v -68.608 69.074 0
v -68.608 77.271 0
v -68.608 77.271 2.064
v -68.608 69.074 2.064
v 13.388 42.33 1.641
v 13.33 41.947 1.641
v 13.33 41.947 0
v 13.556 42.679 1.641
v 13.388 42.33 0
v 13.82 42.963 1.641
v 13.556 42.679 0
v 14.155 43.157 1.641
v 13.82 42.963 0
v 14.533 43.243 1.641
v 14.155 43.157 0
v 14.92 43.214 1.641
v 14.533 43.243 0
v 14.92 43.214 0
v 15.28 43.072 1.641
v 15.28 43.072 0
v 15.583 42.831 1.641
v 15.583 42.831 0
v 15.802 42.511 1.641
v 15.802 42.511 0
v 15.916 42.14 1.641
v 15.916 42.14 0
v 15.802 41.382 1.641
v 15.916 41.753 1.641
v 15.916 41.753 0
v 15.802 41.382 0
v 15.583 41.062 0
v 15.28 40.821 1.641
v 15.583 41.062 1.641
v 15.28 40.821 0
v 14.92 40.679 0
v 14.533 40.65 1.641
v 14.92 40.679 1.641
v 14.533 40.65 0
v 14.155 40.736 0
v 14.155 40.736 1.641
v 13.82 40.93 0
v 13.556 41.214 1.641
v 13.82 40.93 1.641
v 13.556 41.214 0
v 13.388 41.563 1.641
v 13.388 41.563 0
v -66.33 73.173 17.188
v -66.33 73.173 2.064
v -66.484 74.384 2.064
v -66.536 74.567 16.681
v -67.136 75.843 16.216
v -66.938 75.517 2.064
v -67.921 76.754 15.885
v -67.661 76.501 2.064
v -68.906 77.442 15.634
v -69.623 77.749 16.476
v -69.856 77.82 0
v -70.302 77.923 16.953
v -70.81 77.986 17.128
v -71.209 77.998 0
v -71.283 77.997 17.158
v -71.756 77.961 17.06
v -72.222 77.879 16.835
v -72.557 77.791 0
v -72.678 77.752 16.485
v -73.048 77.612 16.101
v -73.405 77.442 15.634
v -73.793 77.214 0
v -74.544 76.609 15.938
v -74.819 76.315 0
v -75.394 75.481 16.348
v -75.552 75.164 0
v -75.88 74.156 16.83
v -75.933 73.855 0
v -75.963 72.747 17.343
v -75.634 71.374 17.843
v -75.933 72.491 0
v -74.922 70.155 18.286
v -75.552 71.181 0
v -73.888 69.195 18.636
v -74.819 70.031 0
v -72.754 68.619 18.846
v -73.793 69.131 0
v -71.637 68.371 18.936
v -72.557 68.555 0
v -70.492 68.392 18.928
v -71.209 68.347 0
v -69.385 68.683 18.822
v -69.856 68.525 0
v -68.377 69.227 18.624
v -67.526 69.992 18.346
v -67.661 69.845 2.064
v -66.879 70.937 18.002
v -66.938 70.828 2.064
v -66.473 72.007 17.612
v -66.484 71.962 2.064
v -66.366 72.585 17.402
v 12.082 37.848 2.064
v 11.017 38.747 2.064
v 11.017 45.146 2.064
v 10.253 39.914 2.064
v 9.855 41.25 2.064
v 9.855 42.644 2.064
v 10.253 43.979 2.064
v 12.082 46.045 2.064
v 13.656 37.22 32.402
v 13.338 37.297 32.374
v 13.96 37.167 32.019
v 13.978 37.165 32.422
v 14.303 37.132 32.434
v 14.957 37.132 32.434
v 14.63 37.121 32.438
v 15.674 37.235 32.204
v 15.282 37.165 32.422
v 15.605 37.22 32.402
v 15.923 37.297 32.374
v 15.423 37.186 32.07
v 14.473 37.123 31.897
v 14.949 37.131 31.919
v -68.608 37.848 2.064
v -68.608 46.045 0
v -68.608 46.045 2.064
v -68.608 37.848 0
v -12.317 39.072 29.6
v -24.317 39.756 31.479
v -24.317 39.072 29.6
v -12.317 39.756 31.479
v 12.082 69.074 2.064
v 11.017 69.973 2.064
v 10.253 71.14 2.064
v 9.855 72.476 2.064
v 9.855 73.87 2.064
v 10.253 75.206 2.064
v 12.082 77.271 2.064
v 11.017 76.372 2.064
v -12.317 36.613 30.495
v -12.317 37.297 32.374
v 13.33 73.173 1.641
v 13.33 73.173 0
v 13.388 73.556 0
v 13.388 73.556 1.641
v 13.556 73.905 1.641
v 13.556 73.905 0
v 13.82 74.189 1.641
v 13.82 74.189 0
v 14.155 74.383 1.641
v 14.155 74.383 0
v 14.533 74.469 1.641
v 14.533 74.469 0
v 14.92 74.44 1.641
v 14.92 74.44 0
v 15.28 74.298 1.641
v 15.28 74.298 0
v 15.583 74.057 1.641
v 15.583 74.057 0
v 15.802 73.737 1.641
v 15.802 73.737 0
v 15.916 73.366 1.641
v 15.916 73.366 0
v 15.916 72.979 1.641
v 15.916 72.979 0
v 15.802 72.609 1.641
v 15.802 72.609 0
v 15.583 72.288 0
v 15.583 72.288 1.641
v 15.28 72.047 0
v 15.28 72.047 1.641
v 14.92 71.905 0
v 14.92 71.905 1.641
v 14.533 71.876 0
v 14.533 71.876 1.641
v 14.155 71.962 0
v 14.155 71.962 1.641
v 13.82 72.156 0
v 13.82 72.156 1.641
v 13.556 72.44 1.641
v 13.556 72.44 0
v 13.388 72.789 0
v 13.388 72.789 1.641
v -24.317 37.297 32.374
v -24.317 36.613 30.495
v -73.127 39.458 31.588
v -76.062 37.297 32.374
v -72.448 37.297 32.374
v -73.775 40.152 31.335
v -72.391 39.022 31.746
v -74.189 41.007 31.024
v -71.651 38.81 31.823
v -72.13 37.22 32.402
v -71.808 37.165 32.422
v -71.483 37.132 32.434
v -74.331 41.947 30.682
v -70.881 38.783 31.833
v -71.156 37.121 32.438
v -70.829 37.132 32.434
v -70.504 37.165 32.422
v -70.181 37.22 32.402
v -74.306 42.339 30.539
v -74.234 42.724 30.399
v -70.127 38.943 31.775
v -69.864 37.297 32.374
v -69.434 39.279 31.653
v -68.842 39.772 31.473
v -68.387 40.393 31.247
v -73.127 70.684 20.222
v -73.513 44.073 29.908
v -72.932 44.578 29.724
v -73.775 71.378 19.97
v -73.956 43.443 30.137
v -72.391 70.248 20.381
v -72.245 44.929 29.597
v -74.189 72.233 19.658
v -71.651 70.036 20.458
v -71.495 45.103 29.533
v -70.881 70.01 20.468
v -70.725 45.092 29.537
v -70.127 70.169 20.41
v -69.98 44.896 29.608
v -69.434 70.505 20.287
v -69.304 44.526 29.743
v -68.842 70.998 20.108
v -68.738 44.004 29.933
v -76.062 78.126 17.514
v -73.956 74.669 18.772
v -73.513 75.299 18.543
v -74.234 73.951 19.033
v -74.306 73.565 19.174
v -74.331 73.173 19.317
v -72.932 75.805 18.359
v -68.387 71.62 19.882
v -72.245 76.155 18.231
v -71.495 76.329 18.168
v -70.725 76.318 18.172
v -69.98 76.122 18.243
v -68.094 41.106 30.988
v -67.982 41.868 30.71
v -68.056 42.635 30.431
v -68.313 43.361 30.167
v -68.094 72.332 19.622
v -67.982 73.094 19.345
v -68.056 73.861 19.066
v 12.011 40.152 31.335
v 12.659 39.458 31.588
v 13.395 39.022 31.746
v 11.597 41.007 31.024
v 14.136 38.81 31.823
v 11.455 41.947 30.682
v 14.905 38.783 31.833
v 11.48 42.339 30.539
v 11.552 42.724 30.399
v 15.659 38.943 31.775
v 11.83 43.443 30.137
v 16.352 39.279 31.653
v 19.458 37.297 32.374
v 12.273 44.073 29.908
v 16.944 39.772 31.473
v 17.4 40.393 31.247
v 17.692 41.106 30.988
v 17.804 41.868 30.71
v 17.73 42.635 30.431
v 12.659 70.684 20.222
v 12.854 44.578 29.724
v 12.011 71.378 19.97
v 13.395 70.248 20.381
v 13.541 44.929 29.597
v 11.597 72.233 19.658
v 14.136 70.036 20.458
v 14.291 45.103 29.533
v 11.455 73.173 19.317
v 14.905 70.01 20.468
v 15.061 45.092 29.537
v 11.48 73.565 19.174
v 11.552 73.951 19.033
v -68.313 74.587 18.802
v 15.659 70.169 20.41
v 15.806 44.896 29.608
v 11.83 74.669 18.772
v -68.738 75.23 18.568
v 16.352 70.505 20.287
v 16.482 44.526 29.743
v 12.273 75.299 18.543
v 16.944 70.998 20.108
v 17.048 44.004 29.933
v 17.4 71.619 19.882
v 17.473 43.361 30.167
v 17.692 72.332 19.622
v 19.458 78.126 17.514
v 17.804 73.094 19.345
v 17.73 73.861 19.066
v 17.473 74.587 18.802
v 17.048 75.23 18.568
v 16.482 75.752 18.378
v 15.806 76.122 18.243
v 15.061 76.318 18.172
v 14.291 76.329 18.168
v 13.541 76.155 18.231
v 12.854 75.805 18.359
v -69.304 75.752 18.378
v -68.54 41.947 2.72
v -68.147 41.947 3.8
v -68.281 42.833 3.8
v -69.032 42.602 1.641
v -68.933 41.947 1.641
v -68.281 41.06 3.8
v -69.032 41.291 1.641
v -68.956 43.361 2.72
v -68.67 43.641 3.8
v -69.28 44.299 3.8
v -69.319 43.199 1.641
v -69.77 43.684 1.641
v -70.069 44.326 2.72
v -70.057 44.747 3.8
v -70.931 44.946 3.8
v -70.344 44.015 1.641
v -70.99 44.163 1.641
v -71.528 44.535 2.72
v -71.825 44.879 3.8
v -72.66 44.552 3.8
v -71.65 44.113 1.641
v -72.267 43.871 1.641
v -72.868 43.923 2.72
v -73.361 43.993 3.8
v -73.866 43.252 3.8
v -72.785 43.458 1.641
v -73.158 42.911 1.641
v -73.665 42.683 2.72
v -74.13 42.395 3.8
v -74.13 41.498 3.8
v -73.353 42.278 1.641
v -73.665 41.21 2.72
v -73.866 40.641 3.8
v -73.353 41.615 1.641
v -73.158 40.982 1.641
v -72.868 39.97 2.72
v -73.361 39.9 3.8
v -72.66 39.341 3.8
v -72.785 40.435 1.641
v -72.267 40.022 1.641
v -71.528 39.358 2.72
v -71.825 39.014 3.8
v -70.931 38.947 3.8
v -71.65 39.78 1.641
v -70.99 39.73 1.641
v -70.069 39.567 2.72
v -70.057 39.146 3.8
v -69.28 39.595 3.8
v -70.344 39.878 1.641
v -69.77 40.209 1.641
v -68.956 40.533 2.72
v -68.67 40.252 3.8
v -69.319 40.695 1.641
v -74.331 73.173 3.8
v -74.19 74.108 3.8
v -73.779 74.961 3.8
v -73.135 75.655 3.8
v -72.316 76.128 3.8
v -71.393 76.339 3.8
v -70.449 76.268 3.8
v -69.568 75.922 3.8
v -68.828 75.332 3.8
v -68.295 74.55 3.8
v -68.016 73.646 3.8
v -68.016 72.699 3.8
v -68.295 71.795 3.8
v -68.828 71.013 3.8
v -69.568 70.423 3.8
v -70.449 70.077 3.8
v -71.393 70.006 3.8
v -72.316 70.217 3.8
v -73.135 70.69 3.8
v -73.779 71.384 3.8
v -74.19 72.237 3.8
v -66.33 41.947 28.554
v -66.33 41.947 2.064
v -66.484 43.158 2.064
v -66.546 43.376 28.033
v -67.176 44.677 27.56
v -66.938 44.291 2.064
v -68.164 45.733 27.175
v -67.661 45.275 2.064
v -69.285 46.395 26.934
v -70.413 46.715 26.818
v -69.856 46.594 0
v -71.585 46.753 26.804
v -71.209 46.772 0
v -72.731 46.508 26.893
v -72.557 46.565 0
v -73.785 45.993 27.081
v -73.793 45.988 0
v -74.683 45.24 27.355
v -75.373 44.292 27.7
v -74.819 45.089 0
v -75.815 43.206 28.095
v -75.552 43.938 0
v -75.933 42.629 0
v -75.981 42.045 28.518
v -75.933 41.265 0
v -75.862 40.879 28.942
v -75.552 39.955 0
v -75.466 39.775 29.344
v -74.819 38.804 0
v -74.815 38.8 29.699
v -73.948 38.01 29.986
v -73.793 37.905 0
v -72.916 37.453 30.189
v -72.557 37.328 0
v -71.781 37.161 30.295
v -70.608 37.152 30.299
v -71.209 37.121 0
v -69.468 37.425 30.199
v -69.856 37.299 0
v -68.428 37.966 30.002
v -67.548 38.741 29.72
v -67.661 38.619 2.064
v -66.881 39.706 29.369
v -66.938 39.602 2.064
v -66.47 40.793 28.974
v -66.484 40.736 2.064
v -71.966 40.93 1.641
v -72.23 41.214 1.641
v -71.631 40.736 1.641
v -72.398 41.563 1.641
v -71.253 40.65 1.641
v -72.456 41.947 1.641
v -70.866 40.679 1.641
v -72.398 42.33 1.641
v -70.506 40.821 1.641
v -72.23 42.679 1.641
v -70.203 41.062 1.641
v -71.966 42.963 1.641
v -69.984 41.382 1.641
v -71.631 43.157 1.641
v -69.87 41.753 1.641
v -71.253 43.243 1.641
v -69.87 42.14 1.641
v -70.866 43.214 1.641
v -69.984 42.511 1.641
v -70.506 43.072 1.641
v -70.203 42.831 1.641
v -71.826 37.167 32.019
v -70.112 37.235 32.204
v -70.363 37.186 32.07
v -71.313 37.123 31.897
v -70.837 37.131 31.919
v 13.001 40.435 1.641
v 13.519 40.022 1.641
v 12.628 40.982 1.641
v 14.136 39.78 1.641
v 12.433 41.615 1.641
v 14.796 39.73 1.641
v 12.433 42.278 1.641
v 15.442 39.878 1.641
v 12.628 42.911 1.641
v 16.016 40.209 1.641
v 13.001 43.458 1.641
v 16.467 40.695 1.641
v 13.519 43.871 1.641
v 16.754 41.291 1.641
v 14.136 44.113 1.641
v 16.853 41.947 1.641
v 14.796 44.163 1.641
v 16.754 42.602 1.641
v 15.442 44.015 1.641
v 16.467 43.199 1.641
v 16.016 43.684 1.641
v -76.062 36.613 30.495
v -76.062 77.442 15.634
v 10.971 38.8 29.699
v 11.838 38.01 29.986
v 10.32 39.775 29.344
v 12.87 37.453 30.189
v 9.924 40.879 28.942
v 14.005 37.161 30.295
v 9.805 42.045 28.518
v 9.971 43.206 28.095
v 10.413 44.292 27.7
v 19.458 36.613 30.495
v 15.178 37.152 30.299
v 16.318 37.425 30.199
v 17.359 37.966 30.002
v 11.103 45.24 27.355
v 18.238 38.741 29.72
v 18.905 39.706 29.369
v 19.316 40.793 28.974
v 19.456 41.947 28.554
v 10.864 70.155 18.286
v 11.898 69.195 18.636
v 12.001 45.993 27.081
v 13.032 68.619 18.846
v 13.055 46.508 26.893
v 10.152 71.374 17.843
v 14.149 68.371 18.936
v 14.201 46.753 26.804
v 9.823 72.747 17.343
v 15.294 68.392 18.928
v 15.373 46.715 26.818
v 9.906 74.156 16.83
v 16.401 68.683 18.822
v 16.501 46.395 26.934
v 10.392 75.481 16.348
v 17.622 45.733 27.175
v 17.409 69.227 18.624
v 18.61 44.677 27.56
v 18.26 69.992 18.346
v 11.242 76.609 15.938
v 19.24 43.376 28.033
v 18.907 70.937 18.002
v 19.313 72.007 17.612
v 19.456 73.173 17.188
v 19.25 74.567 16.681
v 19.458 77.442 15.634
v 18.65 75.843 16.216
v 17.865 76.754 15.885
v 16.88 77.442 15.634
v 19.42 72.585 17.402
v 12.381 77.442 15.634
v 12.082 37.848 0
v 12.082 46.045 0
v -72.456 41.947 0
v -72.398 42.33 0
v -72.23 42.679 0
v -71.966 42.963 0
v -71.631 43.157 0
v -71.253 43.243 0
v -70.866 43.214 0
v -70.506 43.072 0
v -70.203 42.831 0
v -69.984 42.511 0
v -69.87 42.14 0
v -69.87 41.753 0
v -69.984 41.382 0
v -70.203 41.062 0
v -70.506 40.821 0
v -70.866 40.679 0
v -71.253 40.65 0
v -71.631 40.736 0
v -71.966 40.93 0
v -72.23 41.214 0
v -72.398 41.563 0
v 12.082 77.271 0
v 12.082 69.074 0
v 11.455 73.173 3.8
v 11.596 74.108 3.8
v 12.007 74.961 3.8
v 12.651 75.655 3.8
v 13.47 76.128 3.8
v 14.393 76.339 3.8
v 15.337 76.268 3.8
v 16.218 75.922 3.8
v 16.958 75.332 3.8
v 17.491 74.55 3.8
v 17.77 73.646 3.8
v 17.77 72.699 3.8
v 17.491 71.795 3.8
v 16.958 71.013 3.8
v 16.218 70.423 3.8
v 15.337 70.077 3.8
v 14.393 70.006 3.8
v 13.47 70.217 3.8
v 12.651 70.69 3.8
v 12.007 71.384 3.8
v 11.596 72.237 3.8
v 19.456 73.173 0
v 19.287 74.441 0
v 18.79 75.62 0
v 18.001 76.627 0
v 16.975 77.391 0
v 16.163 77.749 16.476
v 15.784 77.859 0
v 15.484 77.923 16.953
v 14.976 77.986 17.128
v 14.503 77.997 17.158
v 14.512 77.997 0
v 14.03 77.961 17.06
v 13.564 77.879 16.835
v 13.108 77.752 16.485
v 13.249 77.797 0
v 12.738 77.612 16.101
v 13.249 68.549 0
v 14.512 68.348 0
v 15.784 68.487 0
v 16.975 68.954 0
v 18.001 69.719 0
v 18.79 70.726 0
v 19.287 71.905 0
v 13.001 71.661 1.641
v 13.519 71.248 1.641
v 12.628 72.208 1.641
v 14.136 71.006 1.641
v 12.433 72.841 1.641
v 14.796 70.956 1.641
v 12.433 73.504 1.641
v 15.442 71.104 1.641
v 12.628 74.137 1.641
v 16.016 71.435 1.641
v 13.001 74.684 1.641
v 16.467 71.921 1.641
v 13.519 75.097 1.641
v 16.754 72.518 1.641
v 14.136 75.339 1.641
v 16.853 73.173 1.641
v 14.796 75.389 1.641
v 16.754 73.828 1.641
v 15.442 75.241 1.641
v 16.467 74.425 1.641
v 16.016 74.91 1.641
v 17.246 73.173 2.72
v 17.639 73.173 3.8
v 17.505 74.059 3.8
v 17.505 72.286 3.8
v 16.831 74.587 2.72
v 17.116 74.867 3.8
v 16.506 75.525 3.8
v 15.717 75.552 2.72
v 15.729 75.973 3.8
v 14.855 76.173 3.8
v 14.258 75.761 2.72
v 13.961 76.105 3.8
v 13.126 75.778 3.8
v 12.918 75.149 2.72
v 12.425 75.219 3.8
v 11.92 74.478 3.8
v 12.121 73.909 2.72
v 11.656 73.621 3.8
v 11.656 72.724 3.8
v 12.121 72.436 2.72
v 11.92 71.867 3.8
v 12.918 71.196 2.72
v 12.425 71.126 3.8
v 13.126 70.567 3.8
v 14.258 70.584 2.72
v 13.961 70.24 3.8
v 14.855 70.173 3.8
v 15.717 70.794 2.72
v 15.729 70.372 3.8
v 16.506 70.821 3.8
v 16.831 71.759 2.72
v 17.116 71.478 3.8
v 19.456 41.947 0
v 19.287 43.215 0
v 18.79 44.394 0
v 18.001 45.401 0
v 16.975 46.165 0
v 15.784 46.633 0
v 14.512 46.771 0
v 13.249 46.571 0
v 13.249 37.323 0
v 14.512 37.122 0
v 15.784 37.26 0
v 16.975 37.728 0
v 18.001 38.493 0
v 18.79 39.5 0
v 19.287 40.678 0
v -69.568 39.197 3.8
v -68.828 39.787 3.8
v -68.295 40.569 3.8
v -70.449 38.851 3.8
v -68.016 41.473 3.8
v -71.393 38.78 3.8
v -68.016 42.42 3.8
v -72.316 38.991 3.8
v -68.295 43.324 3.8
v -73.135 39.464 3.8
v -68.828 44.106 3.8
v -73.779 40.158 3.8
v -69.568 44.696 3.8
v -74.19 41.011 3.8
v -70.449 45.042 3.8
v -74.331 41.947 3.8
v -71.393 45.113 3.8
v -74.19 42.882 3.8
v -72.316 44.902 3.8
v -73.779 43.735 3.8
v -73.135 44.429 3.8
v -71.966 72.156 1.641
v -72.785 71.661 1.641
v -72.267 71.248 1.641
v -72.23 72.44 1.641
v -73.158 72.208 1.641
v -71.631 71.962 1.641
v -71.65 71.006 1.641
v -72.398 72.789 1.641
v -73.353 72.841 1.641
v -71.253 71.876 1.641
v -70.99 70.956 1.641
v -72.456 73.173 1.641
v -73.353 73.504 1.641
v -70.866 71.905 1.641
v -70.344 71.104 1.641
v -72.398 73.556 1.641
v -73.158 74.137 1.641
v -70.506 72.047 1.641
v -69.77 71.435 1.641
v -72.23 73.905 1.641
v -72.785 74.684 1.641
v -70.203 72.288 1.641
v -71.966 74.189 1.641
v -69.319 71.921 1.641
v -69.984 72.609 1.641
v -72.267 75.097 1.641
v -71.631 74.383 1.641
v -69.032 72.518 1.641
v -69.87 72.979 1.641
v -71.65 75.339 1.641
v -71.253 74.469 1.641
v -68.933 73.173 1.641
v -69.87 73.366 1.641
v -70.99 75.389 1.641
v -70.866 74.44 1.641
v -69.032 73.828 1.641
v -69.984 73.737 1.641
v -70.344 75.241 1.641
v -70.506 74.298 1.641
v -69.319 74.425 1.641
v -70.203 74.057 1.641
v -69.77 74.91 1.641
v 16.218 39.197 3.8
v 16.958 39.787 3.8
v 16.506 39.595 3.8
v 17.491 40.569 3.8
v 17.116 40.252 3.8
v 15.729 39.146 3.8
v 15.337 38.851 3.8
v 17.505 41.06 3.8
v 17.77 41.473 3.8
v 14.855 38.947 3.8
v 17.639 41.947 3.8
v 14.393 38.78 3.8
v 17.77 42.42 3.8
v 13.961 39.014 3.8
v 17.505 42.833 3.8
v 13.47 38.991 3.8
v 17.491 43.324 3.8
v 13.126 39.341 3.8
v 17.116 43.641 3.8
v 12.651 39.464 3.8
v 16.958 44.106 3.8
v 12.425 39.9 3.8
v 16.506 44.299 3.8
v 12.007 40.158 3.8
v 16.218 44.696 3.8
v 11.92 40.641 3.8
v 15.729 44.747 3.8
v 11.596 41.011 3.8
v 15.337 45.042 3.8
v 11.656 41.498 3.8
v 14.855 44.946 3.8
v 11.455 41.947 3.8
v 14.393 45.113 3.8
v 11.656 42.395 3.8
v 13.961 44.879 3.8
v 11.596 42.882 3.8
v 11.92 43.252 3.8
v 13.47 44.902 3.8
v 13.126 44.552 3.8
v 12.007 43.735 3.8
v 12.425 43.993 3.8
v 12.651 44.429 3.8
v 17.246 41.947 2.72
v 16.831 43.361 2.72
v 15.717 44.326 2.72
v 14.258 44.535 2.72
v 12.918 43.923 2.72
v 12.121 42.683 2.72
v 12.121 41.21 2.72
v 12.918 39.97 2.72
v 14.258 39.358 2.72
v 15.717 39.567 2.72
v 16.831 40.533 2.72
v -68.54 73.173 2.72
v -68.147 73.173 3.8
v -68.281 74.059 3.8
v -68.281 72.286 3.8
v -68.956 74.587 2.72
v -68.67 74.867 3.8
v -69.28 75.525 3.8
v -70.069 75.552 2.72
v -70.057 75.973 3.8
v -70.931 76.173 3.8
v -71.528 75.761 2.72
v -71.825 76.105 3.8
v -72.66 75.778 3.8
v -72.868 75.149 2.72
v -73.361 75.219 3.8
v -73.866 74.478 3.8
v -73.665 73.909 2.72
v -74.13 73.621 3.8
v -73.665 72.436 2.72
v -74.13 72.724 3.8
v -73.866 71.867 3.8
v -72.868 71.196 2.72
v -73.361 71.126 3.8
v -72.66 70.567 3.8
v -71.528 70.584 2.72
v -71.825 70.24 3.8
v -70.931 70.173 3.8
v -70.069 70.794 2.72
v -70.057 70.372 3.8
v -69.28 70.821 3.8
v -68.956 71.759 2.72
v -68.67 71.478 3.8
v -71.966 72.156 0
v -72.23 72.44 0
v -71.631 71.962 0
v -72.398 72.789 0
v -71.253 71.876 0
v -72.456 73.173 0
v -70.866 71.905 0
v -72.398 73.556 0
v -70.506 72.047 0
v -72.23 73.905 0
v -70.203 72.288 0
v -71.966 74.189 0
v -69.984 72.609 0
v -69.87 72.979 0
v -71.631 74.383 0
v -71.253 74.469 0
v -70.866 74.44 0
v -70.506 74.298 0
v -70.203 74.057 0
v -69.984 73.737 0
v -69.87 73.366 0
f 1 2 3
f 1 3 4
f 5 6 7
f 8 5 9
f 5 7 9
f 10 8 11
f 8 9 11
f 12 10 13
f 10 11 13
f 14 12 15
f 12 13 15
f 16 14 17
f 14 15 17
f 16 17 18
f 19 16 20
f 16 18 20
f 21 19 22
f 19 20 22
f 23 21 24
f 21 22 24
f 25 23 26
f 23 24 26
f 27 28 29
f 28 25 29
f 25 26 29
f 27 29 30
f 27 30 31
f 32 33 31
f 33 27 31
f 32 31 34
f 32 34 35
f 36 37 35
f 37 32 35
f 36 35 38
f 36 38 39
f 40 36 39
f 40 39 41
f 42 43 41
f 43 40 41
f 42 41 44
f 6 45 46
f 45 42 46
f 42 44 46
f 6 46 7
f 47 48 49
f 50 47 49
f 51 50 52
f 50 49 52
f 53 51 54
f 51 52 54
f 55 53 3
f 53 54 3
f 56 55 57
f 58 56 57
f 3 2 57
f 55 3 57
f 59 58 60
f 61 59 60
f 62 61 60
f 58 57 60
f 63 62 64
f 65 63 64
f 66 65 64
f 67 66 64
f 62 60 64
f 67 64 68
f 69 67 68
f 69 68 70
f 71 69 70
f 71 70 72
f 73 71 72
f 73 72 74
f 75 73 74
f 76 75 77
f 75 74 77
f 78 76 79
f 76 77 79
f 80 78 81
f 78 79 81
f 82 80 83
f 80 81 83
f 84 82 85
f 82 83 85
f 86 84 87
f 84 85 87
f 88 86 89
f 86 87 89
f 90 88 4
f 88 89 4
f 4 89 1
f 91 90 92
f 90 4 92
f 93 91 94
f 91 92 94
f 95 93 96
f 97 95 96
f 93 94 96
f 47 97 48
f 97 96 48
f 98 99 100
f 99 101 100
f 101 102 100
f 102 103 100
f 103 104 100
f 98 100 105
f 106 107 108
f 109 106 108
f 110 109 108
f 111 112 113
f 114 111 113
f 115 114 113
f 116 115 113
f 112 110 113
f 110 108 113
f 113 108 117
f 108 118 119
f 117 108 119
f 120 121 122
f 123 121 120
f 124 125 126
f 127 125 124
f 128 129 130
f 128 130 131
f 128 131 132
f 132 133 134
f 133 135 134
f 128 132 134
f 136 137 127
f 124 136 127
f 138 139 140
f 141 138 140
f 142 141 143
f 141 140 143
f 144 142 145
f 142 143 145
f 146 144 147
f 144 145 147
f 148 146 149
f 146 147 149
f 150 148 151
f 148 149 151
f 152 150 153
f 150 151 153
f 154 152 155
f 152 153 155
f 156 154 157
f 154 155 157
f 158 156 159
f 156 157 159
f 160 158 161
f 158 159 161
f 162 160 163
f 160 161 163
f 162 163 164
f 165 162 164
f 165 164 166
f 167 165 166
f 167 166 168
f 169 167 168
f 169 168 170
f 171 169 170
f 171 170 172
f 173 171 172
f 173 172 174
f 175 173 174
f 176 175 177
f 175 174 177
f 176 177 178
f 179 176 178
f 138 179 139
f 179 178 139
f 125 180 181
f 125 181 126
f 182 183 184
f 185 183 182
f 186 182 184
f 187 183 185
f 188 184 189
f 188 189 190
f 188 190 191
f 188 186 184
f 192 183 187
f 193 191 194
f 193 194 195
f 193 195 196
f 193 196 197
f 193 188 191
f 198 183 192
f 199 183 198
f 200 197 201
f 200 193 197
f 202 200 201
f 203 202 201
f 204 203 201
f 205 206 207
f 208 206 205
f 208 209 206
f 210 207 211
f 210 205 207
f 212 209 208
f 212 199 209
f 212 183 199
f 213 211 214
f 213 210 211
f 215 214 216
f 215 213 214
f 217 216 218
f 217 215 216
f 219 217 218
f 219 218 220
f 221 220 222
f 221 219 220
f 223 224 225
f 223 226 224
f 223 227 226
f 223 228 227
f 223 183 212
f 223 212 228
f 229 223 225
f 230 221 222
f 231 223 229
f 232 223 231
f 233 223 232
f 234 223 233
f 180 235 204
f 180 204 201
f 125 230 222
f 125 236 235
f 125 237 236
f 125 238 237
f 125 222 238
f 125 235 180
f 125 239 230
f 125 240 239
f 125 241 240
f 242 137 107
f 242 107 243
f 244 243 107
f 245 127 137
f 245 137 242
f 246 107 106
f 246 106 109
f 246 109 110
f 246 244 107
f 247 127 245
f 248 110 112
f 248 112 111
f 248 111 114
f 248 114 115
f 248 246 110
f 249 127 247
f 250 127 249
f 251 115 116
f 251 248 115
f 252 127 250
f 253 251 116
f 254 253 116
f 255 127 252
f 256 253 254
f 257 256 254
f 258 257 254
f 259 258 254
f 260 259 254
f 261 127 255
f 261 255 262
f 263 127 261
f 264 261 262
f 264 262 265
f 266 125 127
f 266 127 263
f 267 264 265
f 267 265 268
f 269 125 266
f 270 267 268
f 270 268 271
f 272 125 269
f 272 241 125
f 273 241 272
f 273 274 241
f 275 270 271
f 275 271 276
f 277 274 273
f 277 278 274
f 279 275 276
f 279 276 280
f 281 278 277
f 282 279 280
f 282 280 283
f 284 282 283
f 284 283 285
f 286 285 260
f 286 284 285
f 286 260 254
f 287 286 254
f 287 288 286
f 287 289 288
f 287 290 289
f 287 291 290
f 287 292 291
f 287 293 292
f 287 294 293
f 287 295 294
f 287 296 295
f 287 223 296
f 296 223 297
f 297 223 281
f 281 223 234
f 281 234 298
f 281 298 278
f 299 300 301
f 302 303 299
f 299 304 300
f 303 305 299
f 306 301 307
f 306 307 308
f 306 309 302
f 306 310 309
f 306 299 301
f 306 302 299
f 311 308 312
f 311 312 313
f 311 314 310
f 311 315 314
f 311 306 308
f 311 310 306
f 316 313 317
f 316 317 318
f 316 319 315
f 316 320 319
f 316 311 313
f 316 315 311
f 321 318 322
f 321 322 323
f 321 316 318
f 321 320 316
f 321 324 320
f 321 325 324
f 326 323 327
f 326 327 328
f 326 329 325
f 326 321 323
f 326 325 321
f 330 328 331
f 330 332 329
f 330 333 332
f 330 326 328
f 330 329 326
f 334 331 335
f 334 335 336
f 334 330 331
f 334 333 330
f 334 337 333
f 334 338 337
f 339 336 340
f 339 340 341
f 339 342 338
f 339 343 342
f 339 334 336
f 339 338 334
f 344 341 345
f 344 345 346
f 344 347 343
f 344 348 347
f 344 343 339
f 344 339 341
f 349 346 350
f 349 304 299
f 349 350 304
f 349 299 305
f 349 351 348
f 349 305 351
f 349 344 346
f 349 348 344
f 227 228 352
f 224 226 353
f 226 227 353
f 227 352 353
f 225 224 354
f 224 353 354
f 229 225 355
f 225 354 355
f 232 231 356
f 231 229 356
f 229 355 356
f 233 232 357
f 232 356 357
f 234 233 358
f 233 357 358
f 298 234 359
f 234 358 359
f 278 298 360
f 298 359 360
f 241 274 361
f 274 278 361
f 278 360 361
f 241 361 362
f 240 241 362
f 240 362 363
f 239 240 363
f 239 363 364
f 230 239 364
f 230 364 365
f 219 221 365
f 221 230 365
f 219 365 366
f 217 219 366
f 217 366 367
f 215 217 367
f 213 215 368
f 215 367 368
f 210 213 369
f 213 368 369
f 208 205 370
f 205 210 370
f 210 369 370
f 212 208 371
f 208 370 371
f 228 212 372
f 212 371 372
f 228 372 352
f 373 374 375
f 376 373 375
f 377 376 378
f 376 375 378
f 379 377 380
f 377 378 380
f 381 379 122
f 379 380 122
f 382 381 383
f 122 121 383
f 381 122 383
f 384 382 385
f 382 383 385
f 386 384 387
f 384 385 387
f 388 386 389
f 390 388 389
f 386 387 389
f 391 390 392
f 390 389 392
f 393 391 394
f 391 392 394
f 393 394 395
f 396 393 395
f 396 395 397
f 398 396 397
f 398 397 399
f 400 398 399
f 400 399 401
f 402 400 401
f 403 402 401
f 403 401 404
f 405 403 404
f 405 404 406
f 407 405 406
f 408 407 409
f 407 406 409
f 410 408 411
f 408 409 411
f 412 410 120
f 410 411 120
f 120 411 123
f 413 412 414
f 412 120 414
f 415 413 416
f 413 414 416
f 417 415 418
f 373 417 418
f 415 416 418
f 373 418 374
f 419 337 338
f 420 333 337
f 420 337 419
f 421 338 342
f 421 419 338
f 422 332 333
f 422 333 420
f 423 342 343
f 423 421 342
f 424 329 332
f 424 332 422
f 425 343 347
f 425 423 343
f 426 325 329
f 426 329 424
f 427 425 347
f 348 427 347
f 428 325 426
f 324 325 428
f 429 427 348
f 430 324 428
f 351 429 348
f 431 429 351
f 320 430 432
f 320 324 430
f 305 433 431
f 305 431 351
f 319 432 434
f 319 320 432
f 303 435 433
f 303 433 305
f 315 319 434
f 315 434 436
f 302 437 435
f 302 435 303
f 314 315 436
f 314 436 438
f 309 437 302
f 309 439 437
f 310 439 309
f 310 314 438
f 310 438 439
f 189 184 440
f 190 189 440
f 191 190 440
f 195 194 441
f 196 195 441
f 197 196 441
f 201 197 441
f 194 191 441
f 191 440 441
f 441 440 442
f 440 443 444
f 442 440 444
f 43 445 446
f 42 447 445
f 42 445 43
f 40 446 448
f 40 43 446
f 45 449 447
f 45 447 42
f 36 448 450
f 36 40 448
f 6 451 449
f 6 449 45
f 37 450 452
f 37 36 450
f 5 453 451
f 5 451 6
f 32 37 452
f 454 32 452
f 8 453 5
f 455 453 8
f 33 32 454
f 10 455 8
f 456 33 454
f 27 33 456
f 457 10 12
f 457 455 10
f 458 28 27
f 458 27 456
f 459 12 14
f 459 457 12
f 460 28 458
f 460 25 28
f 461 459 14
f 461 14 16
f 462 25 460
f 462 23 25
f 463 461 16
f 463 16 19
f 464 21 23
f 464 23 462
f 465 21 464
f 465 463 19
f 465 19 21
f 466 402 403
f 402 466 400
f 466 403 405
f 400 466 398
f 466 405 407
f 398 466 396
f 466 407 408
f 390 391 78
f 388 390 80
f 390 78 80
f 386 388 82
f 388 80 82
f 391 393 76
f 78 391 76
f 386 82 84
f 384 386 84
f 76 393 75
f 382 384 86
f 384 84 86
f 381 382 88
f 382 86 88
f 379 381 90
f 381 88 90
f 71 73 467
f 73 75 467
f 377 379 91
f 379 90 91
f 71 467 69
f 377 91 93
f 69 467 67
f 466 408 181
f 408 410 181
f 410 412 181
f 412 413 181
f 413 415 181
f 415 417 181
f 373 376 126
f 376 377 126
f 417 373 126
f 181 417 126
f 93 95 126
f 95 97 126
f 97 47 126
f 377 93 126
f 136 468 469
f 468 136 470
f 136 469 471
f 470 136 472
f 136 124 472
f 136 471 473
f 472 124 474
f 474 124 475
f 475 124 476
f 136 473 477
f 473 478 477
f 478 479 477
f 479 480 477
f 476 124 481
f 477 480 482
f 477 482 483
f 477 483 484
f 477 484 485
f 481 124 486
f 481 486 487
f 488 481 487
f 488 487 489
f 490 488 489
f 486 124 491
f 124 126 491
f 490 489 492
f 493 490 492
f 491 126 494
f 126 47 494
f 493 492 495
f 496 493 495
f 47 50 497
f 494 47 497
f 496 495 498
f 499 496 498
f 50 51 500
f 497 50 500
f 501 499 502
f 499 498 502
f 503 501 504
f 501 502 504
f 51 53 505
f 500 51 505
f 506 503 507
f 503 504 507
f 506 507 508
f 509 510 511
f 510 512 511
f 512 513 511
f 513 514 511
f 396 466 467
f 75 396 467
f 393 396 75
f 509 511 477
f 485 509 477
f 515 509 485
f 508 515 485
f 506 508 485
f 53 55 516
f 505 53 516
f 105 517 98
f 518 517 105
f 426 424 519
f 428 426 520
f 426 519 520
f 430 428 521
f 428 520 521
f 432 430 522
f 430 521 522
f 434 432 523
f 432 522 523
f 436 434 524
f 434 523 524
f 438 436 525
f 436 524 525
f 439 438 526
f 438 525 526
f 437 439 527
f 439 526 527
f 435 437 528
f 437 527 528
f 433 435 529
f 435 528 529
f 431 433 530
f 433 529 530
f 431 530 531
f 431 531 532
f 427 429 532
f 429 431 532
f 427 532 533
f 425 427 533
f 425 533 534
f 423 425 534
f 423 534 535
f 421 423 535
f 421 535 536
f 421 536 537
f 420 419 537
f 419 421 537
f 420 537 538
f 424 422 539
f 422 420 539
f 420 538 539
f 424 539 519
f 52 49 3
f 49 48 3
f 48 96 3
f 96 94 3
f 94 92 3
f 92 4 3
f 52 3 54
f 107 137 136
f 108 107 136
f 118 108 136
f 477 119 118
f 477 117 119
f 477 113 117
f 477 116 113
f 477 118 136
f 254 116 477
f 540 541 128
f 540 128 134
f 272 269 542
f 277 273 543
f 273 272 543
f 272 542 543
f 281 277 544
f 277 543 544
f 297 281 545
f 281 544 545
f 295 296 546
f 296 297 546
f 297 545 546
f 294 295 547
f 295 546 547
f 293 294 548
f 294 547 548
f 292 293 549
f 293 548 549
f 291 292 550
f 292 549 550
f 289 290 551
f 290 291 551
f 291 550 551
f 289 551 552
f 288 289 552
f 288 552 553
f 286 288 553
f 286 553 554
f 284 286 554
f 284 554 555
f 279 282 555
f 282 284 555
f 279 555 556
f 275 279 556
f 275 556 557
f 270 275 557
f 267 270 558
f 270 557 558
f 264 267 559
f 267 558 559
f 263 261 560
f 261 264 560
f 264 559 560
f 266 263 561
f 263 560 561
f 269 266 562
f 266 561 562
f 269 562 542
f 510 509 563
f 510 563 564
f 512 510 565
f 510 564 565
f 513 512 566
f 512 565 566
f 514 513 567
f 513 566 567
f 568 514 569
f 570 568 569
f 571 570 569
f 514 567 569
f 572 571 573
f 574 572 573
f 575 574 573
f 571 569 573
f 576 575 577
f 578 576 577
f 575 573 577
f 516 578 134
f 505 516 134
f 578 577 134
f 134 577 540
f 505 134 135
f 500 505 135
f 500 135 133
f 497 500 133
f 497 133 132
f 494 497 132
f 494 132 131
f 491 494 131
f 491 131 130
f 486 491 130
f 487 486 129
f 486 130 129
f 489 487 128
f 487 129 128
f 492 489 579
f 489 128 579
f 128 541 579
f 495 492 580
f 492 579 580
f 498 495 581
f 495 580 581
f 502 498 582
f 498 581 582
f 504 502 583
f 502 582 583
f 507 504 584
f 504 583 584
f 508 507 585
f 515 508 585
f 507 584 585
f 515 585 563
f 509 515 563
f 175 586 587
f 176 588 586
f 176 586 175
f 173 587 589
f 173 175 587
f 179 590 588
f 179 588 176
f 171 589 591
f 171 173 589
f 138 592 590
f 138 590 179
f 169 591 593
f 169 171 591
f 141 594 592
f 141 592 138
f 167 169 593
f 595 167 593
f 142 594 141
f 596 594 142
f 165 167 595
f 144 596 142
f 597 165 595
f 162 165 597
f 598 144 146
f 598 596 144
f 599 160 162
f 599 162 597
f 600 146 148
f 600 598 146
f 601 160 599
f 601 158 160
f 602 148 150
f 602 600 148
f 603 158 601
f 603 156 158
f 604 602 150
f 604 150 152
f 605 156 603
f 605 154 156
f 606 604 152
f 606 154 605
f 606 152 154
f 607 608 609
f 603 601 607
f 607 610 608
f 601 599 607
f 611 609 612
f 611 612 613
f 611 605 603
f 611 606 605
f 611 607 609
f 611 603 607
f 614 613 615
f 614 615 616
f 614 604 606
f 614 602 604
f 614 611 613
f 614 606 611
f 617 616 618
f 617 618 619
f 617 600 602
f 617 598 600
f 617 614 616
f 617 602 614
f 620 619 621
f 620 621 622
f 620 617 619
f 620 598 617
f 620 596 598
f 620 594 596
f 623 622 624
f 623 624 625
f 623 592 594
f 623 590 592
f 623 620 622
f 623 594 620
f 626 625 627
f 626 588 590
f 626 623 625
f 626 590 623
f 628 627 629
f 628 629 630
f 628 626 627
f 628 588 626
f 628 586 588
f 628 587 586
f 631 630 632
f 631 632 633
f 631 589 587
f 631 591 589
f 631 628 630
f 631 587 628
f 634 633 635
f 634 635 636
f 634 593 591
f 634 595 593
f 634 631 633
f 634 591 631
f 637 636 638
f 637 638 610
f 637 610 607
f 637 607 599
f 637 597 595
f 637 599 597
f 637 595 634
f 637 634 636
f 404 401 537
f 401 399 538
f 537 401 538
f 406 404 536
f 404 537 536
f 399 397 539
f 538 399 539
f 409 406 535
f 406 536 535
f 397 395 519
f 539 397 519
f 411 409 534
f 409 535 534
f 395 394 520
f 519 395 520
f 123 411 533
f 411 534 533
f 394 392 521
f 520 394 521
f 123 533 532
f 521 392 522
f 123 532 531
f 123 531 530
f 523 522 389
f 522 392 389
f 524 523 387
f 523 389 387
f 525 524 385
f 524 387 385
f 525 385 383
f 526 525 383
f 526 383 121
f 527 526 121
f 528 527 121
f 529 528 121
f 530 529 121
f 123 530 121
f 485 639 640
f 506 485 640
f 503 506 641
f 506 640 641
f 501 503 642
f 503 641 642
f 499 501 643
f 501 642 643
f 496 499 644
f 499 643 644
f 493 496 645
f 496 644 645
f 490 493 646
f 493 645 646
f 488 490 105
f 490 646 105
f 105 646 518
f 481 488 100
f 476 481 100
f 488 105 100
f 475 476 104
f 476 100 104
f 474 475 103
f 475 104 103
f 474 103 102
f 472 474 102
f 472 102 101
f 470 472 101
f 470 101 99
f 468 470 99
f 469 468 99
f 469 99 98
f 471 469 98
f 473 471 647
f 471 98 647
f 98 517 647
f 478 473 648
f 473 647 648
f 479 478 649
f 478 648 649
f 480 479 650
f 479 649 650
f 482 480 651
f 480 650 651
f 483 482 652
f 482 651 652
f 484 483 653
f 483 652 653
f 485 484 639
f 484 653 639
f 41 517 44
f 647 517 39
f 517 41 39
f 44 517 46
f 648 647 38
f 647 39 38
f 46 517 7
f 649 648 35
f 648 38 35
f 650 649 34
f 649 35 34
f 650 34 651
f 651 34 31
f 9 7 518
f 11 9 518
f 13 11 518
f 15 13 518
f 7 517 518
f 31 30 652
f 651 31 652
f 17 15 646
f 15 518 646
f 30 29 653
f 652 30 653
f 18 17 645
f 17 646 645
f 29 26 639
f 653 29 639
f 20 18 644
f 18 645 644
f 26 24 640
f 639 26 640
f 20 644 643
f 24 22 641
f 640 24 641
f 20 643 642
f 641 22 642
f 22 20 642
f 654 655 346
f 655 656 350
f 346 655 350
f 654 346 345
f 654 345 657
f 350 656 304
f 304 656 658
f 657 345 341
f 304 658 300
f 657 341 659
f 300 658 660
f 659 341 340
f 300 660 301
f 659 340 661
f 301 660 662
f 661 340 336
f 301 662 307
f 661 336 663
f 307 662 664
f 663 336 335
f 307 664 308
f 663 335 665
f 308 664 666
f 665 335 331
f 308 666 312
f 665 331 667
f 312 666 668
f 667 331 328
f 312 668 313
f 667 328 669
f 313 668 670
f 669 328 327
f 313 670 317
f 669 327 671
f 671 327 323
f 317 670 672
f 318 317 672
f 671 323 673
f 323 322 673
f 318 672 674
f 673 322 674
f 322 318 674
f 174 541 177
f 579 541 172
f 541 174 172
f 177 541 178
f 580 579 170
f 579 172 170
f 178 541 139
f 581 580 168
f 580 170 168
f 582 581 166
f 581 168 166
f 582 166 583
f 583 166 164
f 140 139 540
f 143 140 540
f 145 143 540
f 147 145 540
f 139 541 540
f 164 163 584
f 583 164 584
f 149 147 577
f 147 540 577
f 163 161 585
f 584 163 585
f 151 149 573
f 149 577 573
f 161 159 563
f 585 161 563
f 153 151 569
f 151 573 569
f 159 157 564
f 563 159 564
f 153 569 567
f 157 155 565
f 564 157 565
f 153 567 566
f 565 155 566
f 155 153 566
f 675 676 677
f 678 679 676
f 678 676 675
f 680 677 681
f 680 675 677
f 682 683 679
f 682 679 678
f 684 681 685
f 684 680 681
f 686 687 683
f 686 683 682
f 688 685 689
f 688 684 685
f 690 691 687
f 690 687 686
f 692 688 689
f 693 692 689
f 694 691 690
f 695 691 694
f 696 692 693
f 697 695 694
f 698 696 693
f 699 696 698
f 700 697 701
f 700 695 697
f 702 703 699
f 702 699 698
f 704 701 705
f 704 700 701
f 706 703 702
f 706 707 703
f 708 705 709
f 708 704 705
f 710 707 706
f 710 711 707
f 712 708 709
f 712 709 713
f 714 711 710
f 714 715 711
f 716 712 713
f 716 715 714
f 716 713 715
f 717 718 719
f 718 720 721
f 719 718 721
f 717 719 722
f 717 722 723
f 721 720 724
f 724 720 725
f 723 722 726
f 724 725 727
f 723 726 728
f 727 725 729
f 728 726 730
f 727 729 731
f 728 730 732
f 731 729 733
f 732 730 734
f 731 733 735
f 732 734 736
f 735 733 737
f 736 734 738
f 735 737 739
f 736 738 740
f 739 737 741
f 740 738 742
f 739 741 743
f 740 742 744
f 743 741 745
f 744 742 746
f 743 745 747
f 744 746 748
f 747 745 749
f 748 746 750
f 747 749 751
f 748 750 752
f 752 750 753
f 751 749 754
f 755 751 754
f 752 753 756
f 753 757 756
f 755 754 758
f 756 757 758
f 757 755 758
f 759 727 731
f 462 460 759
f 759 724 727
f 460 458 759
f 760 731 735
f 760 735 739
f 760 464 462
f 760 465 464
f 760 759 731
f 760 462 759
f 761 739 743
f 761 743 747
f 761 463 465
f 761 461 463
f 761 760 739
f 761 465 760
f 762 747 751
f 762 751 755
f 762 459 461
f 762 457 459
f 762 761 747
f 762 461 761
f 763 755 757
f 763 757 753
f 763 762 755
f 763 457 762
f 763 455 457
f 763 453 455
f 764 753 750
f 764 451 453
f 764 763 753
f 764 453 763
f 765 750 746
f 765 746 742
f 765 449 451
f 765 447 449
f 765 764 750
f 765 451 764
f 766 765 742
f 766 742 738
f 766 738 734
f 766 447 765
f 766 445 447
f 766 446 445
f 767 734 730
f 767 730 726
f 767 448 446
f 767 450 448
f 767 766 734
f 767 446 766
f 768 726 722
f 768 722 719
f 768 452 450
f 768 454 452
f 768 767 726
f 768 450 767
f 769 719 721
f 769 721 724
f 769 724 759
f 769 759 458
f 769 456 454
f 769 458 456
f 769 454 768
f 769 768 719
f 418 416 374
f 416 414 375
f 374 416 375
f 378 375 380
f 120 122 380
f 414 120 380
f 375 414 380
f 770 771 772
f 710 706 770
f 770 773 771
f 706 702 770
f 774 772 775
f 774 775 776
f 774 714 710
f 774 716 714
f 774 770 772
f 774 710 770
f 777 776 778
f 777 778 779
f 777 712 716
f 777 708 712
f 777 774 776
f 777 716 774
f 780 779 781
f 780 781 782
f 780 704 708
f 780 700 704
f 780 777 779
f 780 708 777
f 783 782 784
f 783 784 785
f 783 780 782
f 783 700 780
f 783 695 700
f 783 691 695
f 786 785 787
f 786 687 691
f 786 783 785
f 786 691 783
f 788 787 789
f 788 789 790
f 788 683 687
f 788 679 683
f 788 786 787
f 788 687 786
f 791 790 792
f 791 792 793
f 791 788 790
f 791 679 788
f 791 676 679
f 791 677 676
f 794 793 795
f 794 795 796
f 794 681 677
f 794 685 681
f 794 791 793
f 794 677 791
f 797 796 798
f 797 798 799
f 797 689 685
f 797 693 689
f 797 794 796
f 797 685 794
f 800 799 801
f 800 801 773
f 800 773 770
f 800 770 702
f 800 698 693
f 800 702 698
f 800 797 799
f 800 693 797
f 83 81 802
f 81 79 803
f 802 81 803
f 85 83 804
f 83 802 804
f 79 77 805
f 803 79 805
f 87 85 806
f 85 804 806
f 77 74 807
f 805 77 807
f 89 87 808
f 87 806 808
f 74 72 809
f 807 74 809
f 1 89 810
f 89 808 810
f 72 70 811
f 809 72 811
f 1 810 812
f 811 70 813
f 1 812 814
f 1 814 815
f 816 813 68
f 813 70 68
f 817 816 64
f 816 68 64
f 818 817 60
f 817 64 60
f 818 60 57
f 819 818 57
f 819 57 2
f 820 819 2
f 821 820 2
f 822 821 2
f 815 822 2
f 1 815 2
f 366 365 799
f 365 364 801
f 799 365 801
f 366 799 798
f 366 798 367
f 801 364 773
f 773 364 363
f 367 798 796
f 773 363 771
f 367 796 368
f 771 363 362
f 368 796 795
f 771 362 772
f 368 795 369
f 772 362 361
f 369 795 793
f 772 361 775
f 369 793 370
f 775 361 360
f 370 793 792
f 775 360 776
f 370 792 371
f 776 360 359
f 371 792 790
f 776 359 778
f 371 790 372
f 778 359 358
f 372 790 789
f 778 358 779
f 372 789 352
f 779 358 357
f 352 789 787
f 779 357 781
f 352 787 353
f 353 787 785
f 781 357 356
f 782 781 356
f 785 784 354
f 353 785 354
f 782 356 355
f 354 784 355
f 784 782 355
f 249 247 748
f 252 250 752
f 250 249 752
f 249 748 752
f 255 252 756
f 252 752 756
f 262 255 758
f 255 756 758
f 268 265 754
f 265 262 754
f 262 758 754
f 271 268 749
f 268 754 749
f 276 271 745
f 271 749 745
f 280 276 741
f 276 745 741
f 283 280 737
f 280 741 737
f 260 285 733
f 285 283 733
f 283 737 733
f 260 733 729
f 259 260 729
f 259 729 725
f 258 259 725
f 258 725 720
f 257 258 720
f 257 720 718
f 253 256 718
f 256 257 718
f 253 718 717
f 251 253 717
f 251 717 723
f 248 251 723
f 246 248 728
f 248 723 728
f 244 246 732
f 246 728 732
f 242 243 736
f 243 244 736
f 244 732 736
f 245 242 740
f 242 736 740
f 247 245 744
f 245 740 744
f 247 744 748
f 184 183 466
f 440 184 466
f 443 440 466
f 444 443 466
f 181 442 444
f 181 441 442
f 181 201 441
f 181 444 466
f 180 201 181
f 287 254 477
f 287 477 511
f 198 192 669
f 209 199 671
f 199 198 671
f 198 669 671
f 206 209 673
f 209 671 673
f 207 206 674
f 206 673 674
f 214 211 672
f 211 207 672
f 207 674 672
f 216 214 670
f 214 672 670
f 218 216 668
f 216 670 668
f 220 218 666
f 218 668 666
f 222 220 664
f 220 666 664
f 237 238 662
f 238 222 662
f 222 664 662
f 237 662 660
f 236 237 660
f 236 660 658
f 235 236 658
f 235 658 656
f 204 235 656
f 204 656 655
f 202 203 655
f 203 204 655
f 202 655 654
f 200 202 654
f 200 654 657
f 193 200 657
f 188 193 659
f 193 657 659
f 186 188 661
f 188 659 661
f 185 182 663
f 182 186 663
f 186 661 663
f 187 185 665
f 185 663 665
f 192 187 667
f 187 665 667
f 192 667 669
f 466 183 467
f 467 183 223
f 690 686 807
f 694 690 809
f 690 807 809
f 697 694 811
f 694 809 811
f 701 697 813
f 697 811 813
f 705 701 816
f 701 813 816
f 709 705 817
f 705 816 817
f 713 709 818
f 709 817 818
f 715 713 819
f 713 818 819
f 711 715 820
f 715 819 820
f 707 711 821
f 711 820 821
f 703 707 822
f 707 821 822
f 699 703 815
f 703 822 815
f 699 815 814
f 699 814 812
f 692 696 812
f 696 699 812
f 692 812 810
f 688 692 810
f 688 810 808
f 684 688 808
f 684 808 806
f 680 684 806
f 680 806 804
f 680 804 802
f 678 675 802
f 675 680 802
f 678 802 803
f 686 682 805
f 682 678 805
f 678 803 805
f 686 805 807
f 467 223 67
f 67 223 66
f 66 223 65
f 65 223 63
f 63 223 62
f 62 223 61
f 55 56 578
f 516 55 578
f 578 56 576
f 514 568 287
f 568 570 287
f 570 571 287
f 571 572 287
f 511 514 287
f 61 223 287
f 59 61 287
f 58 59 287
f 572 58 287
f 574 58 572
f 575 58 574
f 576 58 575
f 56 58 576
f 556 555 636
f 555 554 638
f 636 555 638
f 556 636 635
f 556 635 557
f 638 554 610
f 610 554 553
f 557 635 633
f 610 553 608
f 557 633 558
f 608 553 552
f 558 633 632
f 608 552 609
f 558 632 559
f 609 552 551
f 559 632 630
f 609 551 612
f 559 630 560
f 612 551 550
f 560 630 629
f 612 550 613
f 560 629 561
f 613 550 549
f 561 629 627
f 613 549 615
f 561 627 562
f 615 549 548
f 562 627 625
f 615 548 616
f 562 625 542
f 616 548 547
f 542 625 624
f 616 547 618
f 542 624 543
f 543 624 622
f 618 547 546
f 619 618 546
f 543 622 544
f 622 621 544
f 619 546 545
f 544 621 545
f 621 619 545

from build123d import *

# Parameters (mm, degrees)
LCD_MOUNT_TUBE_OUTLINE_R          = 4.826
LCD_MOUNT_TUBE_DEPTH              = 17.560061263
LCD_START                         = 17.560061263
LCD_MOUNT_TUBE_2_OUTLINE_R        = 4.826
LCD_MOUNT_TUBE_2_DEPTH            = 3.513040701
LCD_START_2                       = 43.178154287
LCD_MOUNT_TUBE_3_OUTLINE_W        = 13
LCD_MOUNT_TUBE_3_OUTLINE_H        = 13
LCD_MOUNT_TUBE_3_DEPTH            = 3.821845713
LCD_MOUNT_TUBE_4_OUTLINE_R        = 4.826
LCD_MOUNT_TUBE_4_DEPTH            = 17.560060851
LCD_START_3                       = 17.560060851
LCD_MOUNT_TUBE_5_OUTLINE_R        = 4.826
LCD_MOUNT_TUBE_5_DEPTH            = 3.513040701
LCD_MOUNT_TUBE_6_OUTLINE_W        = 12
LCD_MOUNT_TUBE_6_OUTLINE_H        = 13
LCD_MOUNT_TUBE_6_DEPTH            = 3.821845713
LCD_MOUNT_TUBE_7_OUTLINE_R        = 4.826
LCD_MOUNT_TUBE_7_DEPTH            = 28.925419555
LCD_START_4                       = 28.925419555
LCD_MOUNT_TUBE_8_OUTLINE_R        = 4.826
LCD_MOUNT_TUBE_8_DEPTH            = 3.513040701
LCD_MOUNT_TUBE_9_OUTLINE_W        = 12
LCD_MOUNT_TUBE_9_OUTLINE_H        = 14
LCD_MOUNT_TUBE_9_DEPTH            = 3.821845713
LCD_MOUNT_TUBE_10_OUTLINE_R       = 4.826
LCD_MOUNT_TUBE_10_DEPTH           = 28.925419967
LCD_START_5                       = 28.925419967
LCD_MOUNT_TUBE_11_OUTLINE_R       = 4.826
LCD_MOUNT_TUBE_11_DEPTH           = 3.513040701
LCD_MOUNT_TUBE_12_OUTLINE_W       = 13
LCD_MOUNT_TUBE_12_OUTLINE_H       = 14
LCD_MOUNT_TUBE_12_DEPTH           = 3.821845713
TUBE_PCB_INTERFERENCE_DEPTH       = 2.064
SKETCH3_R                         = 1.3
SCREW_HOLE_DEPTH                  = 114.618937328
SKETCH4_W                         = 95.52
SKETCH4_H                         = 43.45
BACK_PLATE_DEPTH                  = 2
HOLLOW_START                      = -3.8
SKETCH2_R                         = 3.175
HOLLOW_TUBE_DEPTH                 = 110.960288991
SKETCH7_W                         = 12
SKETCH7_H                         = 7.1
USB_CLEARANCE_DEPTH               = 3
SCREW_CATCHING_FUNNEL_OUTLINE_R   = 2.2225
SCREW_CATCHING_FUNNEL_DEPTH       = 2.159
SCREW_CATCHING_FUNNEL_DRAFT       = -20
SCREW_CATCHING_FUNNEL_2_OUTLINE_R = 2.2225
SCREW_CATCHING_FUNNEL_2_DEPTH     = 2.159
SCREW_CATCHING_FUNNEL_2_DRAFT     = -20
SCREW_CATCHING_FUNNEL_3_OUTLINE_R = 2.2225
SCREW_CATCHING_FUNNEL_3_DEPTH     = 2.159
SCREW_CATCHING_FUNNEL_3_DRAFT     = -20
SCREW_CATCHING_FUNNEL_4_OUTLINE_R = 2.2225
SCREW_CATCHING_FUNNEL_4_DEPTH     = 2.159
SCREW_CATCHING_FUNNEL_4_DRAFT     = -20


with BuildPart() as part:
    # LCD mount tube: read off the stored shape, not the designer's step
    # LCD mount tube outline → LCD mount tube (new body)
    with BuildSketch(Plane.XY):
        with Locations((14.630315517, 73.17260569)):
            Circle(LCD_MOUNT_TUBE_OUTLINE_R)
    extrude(amount=LCD_MOUNT_TUBE_DEPTH)

    # LCD mount tube 2 outline → LCD mount tube 2 (add)
    with BuildSketch(Plane.XY.offset(LCD_START)):
        with Locations((14.630315517, 73.17260569)):
            Circle(LCD_MOUNT_TUBE_2_OUTLINE_R)
    extrude(amount=LCD_MOUNT_TUBE_2_DEPTH)

    # LCD mount tube 3 outline → LCD mount tube 3 (cut)
    with BuildSketch(Plane(origin=(0, 0, 0), x_dir=(1, 0, 0), z_dir=(0, 0.3420201433257131, 0.9396926207858923)).offset(LCD_START_2)):
        with Locations((14.5, 62.5)):
            Rectangle(LCD_MOUNT_TUBE_3_OUTLINE_W, LCD_MOUNT_TUBE_3_OUTLINE_H)
    extrude(amount=LCD_MOUNT_TUBE_3_DEPTH, mode=Mode.SUBTRACT)


with BuildPart() as body_2:
    # LCD mount tube 4 outline → LCD mount tube 4 (new body)
    with BuildSketch(Plane.XY):
        with Locations((-71.155750897, 73.172606822)):
            Circle(LCD_MOUNT_TUBE_4_OUTLINE_R)
    extrude(amount=LCD_MOUNT_TUBE_4_DEPTH)

    # LCD mount tube 5 outline → LCD mount tube 5 (add)
    with BuildSketch(Plane.XY.offset(LCD_START_3)):
        with Locations((-71.155750897, 73.172606822)):
            Circle(LCD_MOUNT_TUBE_5_OUTLINE_R)
    extrude(amount=LCD_MOUNT_TUBE_5_DEPTH)

    # LCD mount tube 6 outline → LCD mount tube 6 (cut)
    with BuildSketch(Plane(origin=(0, 0, 0), x_dir=(1, 0, 0), z_dir=(0, 0.3420201433257131, 0.9396926207858923)).offset(LCD_START_2)):
        with Locations((-71, 62.5)):
            Rectangle(LCD_MOUNT_TUBE_6_OUTLINE_W, LCD_MOUNT_TUBE_6_OUTLINE_H)
    extrude(amount=LCD_MOUNT_TUBE_6_DEPTH, mode=Mode.SUBTRACT)


with BuildPart() as body_3:
    # LCD mount tube 7 outline → LCD mount tube 7 (new body)
    with BuildSketch(Plane.XY):
        with Locations((-71.155751248, 41.946540419)):
            Circle(LCD_MOUNT_TUBE_7_OUTLINE_R)
    extrude(amount=LCD_MOUNT_TUBE_7_DEPTH)

    # LCD mount tube 8 outline → LCD mount tube 8 (add)
    with BuildSketch(Plane.XY.offset(LCD_START_4)):
        with Locations((-71.155751248, 41.946540419)):
            Circle(LCD_MOUNT_TUBE_8_OUTLINE_R)
    extrude(amount=LCD_MOUNT_TUBE_8_DEPTH)

    # LCD mount tube 9 outline → LCD mount tube 9 (cut)
    with BuildSketch(Plane(origin=(0, 0, 0), x_dir=(1, 0, 0), z_dir=(0, 0.3420201433257131, 0.9396926207858923)).offset(LCD_START_2)):
        with Locations((-71, 29)):
            Rectangle(LCD_MOUNT_TUBE_9_OUTLINE_W, LCD_MOUNT_TUBE_9_OUTLINE_H)
    extrude(amount=LCD_MOUNT_TUBE_9_DEPTH, mode=Mode.SUBTRACT)


with BuildPart() as body_4:
    # LCD mount tube 10 outline → LCD mount tube 10 (new body)
    with BuildSketch(Plane.XY):
        with Locations((14.630315166, 41.946539286)):
            Circle(LCD_MOUNT_TUBE_10_OUTLINE_R)
    extrude(amount=LCD_MOUNT_TUBE_10_DEPTH)

    # LCD mount tube 11 outline → LCD mount tube 11 (add)
    with BuildSketch(Plane.XY.offset(LCD_START_5)):
        with Locations((14.630315166, 41.946539286)):
            Circle(LCD_MOUNT_TUBE_11_OUTLINE_R)
    extrude(amount=LCD_MOUNT_TUBE_11_DEPTH)

    # LCD mount tube 12 outline → LCD mount tube 12 (cut)
    with BuildSketch(Plane(origin=(0, 0, 0), x_dir=(1, 0, 0), z_dir=(0, 0.3420201433257131, 0.9396926207858923)).offset(LCD_START_2)):
        with Locations((14.5, 29)):
            Rectangle(LCD_MOUNT_TUBE_12_OUTLINE_W, LCD_MOUNT_TUBE_12_OUTLINE_H)
    extrude(amount=LCD_MOUNT_TUBE_12_DEPTH, mode=Mode.SUBTRACT)


with BuildPart() as tube_pcb_interference_tool:
    # Sketch5 → tube PCB interference (new body)
    with BuildSketch(Plane.XY):
        Polygon((12.082314183, 81.622175529), (8.870527881, 81.622175529), (8.870527362, 35.408676422), (12.082313664, 35.408676422), align=None)
        Polygon((-65.395963072, 81.622175529), (-68.607749373, 81.622175529), (-68.607749893, 35.408676422), (-65.395963591, 35.408676422), align=None)
    extrude(amount=TUBE_PCB_INTERFERENCE_DEPTH)


with BuildPart() as part_1:
    add(part.part)

    # tube PCB interference: cut by tube_pcb_interference_tool
    add(tube_pcb_interference_tool.part, mode=Mode.SUBTRACT)


with BuildPart() as body_2_1:
    add(body_2.part)

    # tube PCB interference: cut by tube_pcb_interference_tool
    add(tube_pcb_interference_tool.part, mode=Mode.SUBTRACT)


with BuildPart() as body_3_1:
    add(body_3.part)

    # tube PCB interference: cut by tube_pcb_interference_tool
    add(tube_pcb_interference_tool.part, mode=Mode.SUBTRACT)


with BuildPart() as body_4_1:
    add(body_4.part)

    # tube PCB interference: cut by tube_pcb_interference_tool
    add(tube_pcb_interference_tool.part, mode=Mode.SUBTRACT)


with BuildPart() as screw_hole_tool:
    # Sketch3 → screw hole (new, through all)
    with BuildSketch(Plane(origin=(0, 0, 0), x_dir=(-1, 0, 0), z_dir=(0, 0, -1))):
        with Locations((71.155750897, 73.172606822)):
            Circle(SKETCH3_R)
        with Locations((71.155751248, 41.946540419)):
            Circle(SKETCH3_R)
        with Locations((-14.630315166, 41.946539286)):
            Circle(SKETCH3_R)
        with Locations((-14.630315517, 73.17260569)):
            Circle(SKETCH3_R)
    extrude(amount=-SCREW_HOLE_DEPTH)


with BuildPart() as part_2:
    add(part_1.part)

    # screw hole: cut by screw_hole_tool
    add(screw_hole_tool.part, mode=Mode.SUBTRACT)



with BuildPart() as body_2_2:
    add(body_2_1.part)

    # screw hole: cut by screw_hole_tool
    add(screw_hole_tool.part, mode=Mode.SUBTRACT)


with BuildPart() as body_3_2:
    add(body_3_1.part)

    # screw hole: cut by screw_hole_tool
    add(screw_hole_tool.part, mode=Mode.SUBTRACT)


with BuildPart() as body_4_2:
    add(body_4_1.part)

    # screw hole: cut by screw_hole_tool
    add(screw_hole_tool.part, mode=Mode.SUBTRACT)


with BuildPart() as part_3:
    add(part_2.part)

    add(body_2_2.part)  # back plate merges body 2

    add(body_3_2.part)  # back plate merges body 3

    add(body_4_2.part)  # back plate merges body 4
    # Sketch4 → back plate (add)
    with BuildSketch(Plane(origin=(0, 14.767798518, 40.574192962), x_dir=(1, 0, 0), z_dir=(-8.110156480009166e-14, 0.3420201433257126, 0.9396926207858924))):
        with Locations((-28.301906678, 45.699826265)):
            Rectangle(SKETCH4_W, SKETCH4_H)
    extrude(amount=-BACK_PLATE_DEPTH)

    # Sketch2 → hollow tube (cut, through all)
    with BuildSketch(Plane(origin=(0, 0, 0), x_dir=(-1, 0, 0), z_dir=(0, 0, -1)).offset(HOLLOW_START)):
        with Locations((71.155750897, 73.172606822)):
            Circle(SKETCH2_R)
        with Locations((71.155751248, 41.946540419)):
            Circle(SKETCH2_R)
        with Locations((-14.630315166, 41.946539286)):
            Circle(SKETCH2_R)
        with Locations((-14.630315517, 73.17260569)):
            Circle(SKETCH2_R)
    extrude(amount=-HOLLOW_TUBE_DEPTH, mode=Mode.SUBTRACT)

    # Sketch7 → USB clearance (cut)
    with BuildSketch(Plane(origin=(0, 14.767798518, 40.574192962), x_dir=(1, 0, 0), z_dir=(-8.110156480009166e-14, 0.3420201433257126, 0.9396926207858924))):
        with Locations((-18.317358646, 23.042126287)):
            Rectangle(SKETCH7_W, SKETCH7_H)
    extrude(amount=-USB_CLEARANCE_DEPTH, mode=Mode.SUBTRACT)


with BuildPart() as screw_catching_funnel_tool:
    # screw catching funnel: read off the stored shape, not the designer's step
    # screw catching funnel outline → screw catching funnel (with draft: the straight prism first)
    with BuildSketch(Plane.XY.offset(1.641)):
        with Locations((14.630315517, 73.17260569)):
            Circle(SCREW_CATCHING_FUNNEL_OUTLINE_R)
        with BuildLine():
            ThreePointArc((13.330315517, 73.17260569), (14.630315517, 74.47260569), (15.930315517, 73.17260569))
            ThreePointArc((15.930315517, 73.17260569), (14.630315517, 71.87260569), (13.330315517, 73.17260569))
        make_face(mode=Mode.SUBTRACT)
    extrude(amount=SCREW_CATCHING_FUNNEL_DEPTH)
    # screw catching funnel: the draft: its side faces are tilted about the plane it starts from
    screw_catching_funnel_sides = [screw_catching_funnel_tool.faces().sort_by_distance(p)[0] for p in [
        (12.407815517, 73.17260569, 2.7205),
        (13.330315517, 73.17260569, 2.7205),
    ]]
    draft(screw_catching_funnel_sides, Plane.XY.offset(1.641), SCREW_CATCHING_FUNNEL_DRAFT)


with BuildPart() as part_4:
    add(part_3.part)

    # screw catching funnel: cut by screw_catching_funnel_tool
    add(screw_catching_funnel_tool.part, mode=Mode.SUBTRACT)


with BuildPart() as screw_catching_funnel_2_tool:
    # screw catching funnel 2 outline → screw catching funnel 2 (with draft: the straight prism first)
    with BuildSketch(Plane.XY.offset(1.641)):
        with Locations((14.630315166, 41.946539286)):
            Circle(SCREW_CATCHING_FUNNEL_2_OUTLINE_R)
        with BuildLine():
            ThreePointArc((13.330315166, 41.946539286), (14.630315166, 43.246539286), (15.930315166, 41.946539286))
            ThreePointArc((15.930315166, 41.946539286), (14.630315166, 40.646539286), (13.330315166, 41.946539286))
        make_face(mode=Mode.SUBTRACT)
    extrude(amount=SCREW_CATCHING_FUNNEL_2_DEPTH)
    # screw catching funnel 2: the draft: its side faces are tilted about the plane it starts from
    screw_catching_funnel_2_sides = [screw_catching_funnel_2_tool.faces().sort_by_distance(p)[0] for p in [
        (12.407815166, 41.946539286, 2.7205),
        (15.930315166, 41.946539286, 2.7205),
    ]]
    draft(screw_catching_funnel_2_sides, Plane.XY.offset(1.641), SCREW_CATCHING_FUNNEL_2_DRAFT)


with BuildPart() as part_5:
    add(part_4.part)

    # screw catching funnel 2: cut by screw_catching_funnel_2_tool
    add(screw_catching_funnel_2_tool.part, mode=Mode.SUBTRACT)


with BuildPart() as screw_catching_funnel_3_tool:
    # screw catching funnel 3 outline → screw catching funnel 3 (with draft: the straight prism first)
    with BuildSketch(Plane.XY.offset(1.641)):
        with Locations((-71.155751248, 41.946540419)):
            Circle(SCREW_CATCHING_FUNNEL_3_OUTLINE_R)
        with BuildLine():
            ThreePointArc((-72.455751248, 41.946540419), (-71.155751248, 43.246540419), (-69.855751248, 41.946540419))
            ThreePointArc((-69.855751248, 41.946540419), (-71.155751248, 40.646540419), (-72.455751248, 41.946540419))
        make_face(mode=Mode.SUBTRACT)
    extrude(amount=SCREW_CATCHING_FUNNEL_3_DEPTH)
    # screw catching funnel 3: the draft: its side faces are tilted about the plane it starts from
    screw_catching_funnel_3_sides = [screw_catching_funnel_3_tool.faces().sort_by_distance(p)[0] for p in [
        (-73.378251248, 41.946540419, 2.7205),
        (-69.855751248, 41.946540419, 2.7205),
    ]]
    draft(screw_catching_funnel_3_sides, Plane.XY.offset(1.641), SCREW_CATCHING_FUNNEL_3_DRAFT)


with BuildPart() as part_6:
    add(part_5.part)

    # screw catching funnel 3: cut by screw_catching_funnel_3_tool
    add(screw_catching_funnel_3_tool.part, mode=Mode.SUBTRACT)


with BuildPart() as screw_catching_funnel_4_tool:
    # screw catching funnel 4 outline → screw catching funnel 4 (with draft: the straight prism first)
    with BuildSketch(Plane.XY.offset(1.641)):
        with Locations((-71.155750897, 73.172606822)):
            Circle(SCREW_CATCHING_FUNNEL_4_OUTLINE_R)
        with BuildLine():
            ThreePointArc((-72.455750897, 73.172606822), (-71.155750897, 74.472606822), (-69.855750897, 73.172606822))
            ThreePointArc((-69.855750897, 73.172606822), (-71.155750897, 71.872606822), (-72.455750897, 73.172606822))
        make_face(mode=Mode.SUBTRACT)
    extrude(amount=SCREW_CATCHING_FUNNEL_4_DEPTH)
    # screw catching funnel 4: the draft: its side faces are tilted about the plane it starts from
    screw_catching_funnel_4_sides = [screw_catching_funnel_4_tool.faces().sort_by_distance(p)[0] for p in [
        (-73.378250897, 73.172606822, 2.7205),
        (-69.855750897, 73.172606822, 2.7205),
    ]]
    draft(screw_catching_funnel_4_sides, Plane.XY.offset(1.641), SCREW_CATCHING_FUNNEL_4_DRAFT)


with BuildPart() as part_7:
    add(part_6.part)

    # screw catching funnel 4: cut by screw_catching_funnel_4_tool
    add(screw_catching_funnel_4_tool.part, mode=Mode.SUBTRACT)


solid = part_7.part
